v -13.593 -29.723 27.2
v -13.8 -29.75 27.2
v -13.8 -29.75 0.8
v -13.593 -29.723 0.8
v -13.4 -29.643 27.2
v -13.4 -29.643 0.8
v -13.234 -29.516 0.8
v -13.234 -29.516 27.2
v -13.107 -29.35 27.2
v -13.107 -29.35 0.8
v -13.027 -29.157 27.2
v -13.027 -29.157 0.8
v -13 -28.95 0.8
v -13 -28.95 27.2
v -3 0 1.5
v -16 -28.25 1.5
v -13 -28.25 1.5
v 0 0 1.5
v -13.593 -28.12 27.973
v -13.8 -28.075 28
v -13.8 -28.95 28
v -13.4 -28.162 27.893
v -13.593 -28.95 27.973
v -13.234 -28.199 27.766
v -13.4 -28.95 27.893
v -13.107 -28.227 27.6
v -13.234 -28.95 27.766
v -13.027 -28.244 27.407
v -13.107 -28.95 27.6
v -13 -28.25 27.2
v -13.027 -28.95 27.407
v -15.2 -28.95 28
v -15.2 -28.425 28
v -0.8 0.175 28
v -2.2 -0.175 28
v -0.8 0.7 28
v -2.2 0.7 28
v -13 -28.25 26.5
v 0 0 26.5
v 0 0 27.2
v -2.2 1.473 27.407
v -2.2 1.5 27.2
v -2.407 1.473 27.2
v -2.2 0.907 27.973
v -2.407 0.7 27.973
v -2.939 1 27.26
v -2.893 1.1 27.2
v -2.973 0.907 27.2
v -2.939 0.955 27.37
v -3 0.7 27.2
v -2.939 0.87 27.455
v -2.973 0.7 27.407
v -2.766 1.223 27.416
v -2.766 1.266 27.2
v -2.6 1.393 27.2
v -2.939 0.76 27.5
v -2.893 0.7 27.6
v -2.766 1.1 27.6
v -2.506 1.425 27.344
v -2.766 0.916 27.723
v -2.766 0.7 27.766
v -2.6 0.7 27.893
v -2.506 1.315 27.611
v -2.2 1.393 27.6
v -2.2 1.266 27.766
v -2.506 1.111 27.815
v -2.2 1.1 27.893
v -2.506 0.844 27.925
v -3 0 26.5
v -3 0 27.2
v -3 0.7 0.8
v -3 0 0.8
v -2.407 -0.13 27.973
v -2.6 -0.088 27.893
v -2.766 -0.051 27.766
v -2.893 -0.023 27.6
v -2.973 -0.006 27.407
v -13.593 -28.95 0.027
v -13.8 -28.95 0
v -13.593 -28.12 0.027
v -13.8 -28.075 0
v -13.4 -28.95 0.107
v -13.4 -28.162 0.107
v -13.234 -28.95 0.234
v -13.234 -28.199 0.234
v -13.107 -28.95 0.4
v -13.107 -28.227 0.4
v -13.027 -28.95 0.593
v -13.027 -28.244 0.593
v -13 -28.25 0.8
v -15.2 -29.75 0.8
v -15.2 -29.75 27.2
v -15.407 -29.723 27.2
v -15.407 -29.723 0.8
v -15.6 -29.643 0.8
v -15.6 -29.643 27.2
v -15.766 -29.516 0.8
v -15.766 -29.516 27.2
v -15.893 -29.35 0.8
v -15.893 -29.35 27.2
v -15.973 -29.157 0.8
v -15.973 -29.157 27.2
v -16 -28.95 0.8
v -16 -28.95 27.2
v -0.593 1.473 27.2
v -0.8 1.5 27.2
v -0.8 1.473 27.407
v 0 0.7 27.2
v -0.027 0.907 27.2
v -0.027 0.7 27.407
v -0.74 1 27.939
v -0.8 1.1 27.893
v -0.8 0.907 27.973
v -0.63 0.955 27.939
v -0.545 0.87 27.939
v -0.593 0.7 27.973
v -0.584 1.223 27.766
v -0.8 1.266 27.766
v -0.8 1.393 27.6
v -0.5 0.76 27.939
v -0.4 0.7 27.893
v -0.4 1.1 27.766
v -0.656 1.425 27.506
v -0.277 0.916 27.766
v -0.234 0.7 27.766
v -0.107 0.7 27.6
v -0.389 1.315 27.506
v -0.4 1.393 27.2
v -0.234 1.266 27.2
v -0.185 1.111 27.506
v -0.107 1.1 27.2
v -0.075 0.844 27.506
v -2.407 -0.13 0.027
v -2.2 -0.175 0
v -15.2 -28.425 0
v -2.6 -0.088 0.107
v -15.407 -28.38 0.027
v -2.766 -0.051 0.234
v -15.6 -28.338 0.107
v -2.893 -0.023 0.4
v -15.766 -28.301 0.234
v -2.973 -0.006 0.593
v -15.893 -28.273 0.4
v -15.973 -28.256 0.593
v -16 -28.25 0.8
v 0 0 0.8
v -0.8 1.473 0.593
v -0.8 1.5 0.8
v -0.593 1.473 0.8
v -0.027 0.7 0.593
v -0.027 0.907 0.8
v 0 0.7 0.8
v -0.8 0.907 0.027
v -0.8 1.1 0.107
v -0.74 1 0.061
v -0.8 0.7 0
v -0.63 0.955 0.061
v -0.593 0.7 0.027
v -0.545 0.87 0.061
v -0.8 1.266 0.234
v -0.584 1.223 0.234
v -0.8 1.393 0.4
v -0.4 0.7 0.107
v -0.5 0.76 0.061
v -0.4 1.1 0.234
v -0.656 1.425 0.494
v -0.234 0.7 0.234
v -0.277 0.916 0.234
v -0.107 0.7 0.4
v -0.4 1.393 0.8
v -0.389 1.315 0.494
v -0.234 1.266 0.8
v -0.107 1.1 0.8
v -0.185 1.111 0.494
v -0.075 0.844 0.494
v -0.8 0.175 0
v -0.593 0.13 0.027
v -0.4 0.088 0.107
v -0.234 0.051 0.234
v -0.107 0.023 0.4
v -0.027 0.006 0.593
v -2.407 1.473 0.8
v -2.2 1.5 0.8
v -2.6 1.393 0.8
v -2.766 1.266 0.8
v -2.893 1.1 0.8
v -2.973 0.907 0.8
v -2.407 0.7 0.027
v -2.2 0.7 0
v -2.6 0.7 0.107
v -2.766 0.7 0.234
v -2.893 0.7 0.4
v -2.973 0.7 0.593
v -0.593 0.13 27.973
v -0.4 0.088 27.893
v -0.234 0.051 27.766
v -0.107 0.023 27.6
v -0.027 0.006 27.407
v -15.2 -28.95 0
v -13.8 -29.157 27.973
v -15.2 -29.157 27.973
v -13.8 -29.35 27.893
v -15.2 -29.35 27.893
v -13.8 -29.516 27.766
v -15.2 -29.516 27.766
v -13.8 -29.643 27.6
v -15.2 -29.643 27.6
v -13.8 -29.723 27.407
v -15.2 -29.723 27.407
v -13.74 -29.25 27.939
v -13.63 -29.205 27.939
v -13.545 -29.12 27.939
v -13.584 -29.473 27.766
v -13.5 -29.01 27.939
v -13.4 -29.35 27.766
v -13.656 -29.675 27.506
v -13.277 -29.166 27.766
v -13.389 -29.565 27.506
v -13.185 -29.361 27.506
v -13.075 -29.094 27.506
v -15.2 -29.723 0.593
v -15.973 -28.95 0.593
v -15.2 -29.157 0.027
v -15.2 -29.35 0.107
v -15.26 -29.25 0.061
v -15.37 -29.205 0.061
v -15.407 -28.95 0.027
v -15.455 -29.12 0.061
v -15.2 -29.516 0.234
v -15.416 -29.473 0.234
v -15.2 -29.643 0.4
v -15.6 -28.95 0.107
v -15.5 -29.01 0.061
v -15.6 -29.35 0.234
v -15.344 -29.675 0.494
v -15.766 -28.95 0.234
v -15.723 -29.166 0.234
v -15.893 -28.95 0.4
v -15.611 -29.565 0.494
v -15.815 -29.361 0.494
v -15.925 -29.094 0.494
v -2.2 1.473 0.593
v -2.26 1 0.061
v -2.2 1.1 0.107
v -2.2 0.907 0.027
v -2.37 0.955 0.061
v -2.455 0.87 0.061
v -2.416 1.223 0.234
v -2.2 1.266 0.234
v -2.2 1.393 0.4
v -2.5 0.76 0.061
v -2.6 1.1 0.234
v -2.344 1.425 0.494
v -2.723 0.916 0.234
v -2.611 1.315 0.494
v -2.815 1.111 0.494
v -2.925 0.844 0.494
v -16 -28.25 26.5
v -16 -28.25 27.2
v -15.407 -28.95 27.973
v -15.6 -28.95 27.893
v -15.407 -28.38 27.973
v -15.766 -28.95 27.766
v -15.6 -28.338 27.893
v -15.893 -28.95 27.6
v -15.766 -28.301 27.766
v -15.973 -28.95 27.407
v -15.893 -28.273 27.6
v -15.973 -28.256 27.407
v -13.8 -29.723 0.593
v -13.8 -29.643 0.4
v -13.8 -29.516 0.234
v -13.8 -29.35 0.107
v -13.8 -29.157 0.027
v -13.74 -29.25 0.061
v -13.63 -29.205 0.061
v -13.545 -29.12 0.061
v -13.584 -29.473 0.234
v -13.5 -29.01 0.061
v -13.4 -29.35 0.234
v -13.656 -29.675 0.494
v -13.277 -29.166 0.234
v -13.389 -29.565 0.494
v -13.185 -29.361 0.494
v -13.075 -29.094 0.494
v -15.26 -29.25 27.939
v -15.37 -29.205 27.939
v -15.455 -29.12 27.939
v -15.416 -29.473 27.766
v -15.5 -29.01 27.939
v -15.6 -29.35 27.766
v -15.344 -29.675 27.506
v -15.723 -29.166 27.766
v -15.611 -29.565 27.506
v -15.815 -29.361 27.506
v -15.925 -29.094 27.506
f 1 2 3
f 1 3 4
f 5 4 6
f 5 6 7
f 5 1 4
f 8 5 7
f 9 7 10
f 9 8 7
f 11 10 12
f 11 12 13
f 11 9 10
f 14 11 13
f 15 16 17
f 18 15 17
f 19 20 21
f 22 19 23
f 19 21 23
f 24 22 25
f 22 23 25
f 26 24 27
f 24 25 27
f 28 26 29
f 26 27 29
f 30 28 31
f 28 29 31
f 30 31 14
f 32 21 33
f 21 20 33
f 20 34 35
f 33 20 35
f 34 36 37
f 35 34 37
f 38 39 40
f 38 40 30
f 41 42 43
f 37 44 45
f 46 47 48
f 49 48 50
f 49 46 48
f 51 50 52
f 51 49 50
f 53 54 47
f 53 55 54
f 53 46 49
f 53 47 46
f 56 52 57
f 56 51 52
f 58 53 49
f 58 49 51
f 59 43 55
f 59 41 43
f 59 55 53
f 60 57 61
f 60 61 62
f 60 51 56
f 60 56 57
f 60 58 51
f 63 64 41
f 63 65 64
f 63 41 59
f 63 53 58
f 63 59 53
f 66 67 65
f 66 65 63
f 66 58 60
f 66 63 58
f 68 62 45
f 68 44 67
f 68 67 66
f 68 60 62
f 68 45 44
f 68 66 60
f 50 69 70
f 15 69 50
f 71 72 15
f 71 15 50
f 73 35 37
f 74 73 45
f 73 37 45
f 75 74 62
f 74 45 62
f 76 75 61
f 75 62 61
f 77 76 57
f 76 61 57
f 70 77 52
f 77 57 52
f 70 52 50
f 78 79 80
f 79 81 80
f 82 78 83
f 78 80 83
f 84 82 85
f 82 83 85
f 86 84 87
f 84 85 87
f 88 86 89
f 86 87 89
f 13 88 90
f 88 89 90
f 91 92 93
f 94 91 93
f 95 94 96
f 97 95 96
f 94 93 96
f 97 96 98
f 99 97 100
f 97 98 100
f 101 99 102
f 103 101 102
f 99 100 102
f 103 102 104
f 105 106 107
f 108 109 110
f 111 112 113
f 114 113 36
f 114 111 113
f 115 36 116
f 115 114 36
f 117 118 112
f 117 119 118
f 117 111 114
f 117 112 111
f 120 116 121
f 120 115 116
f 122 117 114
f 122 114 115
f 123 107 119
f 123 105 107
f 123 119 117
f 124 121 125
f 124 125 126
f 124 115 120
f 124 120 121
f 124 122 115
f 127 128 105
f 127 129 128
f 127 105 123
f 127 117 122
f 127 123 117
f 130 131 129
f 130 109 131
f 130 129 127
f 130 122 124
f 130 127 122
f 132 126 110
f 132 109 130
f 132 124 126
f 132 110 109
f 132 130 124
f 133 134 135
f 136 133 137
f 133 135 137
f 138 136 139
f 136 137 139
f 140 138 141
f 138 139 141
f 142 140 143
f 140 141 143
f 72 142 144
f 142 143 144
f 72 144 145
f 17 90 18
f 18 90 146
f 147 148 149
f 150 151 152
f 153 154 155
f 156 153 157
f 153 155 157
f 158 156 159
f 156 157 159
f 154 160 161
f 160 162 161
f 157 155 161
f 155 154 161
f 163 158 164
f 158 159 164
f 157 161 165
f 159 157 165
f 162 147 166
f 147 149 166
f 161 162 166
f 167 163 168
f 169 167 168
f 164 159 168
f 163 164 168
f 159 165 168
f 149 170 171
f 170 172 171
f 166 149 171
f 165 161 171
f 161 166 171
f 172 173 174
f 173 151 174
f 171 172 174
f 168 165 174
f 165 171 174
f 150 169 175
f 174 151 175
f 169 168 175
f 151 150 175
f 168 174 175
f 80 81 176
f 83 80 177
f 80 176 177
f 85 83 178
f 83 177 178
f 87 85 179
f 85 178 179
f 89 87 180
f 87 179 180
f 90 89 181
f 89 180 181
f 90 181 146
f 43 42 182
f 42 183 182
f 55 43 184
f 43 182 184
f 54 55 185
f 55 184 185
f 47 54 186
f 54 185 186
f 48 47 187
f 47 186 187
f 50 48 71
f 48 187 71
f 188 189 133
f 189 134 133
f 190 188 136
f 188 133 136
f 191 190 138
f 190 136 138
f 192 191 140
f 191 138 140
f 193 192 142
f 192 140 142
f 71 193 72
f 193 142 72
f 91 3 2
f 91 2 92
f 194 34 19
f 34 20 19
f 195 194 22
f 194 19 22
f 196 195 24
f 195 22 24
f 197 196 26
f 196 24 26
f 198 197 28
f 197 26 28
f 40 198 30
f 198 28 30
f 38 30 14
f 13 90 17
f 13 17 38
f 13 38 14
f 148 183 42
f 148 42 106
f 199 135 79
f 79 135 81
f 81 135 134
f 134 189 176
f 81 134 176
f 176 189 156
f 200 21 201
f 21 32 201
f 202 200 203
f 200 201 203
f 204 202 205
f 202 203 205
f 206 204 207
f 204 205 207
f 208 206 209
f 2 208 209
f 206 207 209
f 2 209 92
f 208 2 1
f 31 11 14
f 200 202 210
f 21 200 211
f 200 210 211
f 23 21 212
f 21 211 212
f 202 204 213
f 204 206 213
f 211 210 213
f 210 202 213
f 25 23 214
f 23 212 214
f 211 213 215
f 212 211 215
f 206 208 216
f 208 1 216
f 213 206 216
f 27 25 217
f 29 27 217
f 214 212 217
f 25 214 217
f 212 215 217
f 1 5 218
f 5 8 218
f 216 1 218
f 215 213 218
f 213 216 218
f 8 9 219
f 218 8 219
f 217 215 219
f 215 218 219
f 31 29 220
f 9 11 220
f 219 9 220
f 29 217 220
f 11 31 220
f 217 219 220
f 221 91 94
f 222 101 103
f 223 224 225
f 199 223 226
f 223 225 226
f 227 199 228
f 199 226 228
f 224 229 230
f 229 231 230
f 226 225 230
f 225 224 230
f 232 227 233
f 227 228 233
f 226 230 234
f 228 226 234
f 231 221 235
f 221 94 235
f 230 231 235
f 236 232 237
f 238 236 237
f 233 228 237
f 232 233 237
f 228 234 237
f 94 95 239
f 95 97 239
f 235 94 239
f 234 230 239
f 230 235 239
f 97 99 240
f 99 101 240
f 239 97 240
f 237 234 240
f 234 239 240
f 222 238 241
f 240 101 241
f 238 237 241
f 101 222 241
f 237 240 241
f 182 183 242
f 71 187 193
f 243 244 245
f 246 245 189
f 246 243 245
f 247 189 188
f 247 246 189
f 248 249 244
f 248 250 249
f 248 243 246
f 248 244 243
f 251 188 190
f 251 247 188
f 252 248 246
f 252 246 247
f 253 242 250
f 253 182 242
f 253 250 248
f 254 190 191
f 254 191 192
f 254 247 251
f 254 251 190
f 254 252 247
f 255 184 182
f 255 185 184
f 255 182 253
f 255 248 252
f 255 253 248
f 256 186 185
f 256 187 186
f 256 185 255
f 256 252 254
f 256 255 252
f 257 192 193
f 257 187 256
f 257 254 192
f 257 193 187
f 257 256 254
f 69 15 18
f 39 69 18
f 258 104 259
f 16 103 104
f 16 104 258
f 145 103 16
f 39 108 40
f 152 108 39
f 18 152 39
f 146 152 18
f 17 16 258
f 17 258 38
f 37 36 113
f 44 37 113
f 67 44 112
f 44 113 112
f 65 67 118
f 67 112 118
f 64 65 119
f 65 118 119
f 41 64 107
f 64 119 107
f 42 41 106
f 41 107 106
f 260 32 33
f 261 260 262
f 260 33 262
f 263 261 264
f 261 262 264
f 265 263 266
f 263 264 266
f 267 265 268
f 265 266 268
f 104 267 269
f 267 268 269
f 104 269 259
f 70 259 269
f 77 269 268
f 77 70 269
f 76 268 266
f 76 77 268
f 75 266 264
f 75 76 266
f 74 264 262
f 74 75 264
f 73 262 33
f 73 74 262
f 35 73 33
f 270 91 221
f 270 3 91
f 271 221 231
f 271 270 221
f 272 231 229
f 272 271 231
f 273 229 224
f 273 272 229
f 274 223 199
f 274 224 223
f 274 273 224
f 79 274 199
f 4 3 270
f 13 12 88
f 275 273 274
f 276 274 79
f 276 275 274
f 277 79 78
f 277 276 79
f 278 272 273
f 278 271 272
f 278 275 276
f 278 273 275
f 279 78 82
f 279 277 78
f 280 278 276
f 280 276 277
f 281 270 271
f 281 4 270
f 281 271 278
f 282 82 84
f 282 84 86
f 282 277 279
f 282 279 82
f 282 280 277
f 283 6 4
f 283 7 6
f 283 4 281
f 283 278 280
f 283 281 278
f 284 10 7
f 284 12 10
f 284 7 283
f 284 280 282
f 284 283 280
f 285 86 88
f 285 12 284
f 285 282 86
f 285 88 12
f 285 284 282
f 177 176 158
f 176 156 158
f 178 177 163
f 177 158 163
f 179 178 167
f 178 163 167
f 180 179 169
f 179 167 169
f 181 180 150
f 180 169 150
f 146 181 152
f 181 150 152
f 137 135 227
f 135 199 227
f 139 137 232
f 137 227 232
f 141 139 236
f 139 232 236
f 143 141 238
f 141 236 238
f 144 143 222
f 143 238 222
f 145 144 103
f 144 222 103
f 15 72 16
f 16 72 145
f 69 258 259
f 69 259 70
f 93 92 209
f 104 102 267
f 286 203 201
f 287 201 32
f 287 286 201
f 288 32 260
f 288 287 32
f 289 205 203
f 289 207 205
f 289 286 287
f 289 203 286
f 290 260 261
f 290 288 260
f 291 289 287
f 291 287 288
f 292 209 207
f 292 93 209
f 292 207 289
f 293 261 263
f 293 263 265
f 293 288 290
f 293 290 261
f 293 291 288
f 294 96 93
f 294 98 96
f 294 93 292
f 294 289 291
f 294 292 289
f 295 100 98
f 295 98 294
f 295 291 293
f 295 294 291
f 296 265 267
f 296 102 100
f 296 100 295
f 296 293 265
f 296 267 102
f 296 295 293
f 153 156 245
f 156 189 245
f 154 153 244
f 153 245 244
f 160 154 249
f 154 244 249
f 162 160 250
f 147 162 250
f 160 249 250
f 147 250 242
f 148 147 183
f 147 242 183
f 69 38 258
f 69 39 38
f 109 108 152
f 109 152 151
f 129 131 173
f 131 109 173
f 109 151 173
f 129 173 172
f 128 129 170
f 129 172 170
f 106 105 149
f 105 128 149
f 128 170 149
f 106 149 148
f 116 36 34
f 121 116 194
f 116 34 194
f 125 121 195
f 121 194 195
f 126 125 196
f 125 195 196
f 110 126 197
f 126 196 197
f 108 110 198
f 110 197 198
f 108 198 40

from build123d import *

# Parameters (mm, degrees)
PAD_DEPTH    = 1.5
SKETCH001_W  = 3
SKETCH001_H  = 1.5
PAD001_DEPTH = 25
PAD002_DEPTH = 1.5
FILLET_R     = 0.8


with BuildPart() as part:
    # Sketch → Pad (new body)
    with BuildSketch(Plane.XY):
        Polygon((0, 0), (0, 1.5), (-3, 1.5), (-3, 0), (-16, -28.25), (-16, -29.75), (-13, -29.75), (-13, -28.25), align=None)
    extrude(amount=PAD_DEPTH)

    # Sketch001 (on Face10 of Pad) → Pad001 (join)
    with BuildSketch(Plane.XY.offset(1.5)):
        with Locations((-1.5, 0.75)):
            Rectangle(SKETCH001_W, SKETCH001_H)
        with Locations((-14.5, -29)):
            Rectangle(SKETCH001_W, SKETCH001_H)
    extrude(amount=PAD001_DEPTH)

    # Sketch002 (on Face16 of Pad001) → Pad002 (join)
    with BuildSketch(Plane.XY.offset(26.5)):
        Polygon((-16, -28.25), (-3, 0), (-3, 1.5), (0, 1.5), (0, 0), (-13, -28.25), (-13, -29.75), (-16, -29.75), align=None)
    extrude(amount=PAD002_DEPTH)

    # Fillet
    fillet_edges = [part.edges().sort_by_distance(p)[0] for p in [
        (-16, -29.75, 14),
        (-13, -29.75, 14),
        (-14.5, -29.75, 0),
        (-14.5, -29.75, 28),
        (0, 1.5, 14),
        (-1.5, 1.5, 28),
        (-3, 1.5, 14),
        (-1.5, 1.5, 0),
        (0, 0.75, 0),
        (-6.5, -14.125, 0),
        (-13, -29, 0),
        (-3, 0.75, 0),
        (-9.5, -14.125, 0),
        (-16, -29, 0),
        (0, 0.75, 28),
        (-6.5, -14.125, 28),
        (-13, -29, 28),
        (-3, 0.75, 28),
        (-9.5, -14.125, 28),
        (-16, -29, 28),
    ]]
    fillet(fillet_edges, radius=FILLET_R)


solid = part.part
